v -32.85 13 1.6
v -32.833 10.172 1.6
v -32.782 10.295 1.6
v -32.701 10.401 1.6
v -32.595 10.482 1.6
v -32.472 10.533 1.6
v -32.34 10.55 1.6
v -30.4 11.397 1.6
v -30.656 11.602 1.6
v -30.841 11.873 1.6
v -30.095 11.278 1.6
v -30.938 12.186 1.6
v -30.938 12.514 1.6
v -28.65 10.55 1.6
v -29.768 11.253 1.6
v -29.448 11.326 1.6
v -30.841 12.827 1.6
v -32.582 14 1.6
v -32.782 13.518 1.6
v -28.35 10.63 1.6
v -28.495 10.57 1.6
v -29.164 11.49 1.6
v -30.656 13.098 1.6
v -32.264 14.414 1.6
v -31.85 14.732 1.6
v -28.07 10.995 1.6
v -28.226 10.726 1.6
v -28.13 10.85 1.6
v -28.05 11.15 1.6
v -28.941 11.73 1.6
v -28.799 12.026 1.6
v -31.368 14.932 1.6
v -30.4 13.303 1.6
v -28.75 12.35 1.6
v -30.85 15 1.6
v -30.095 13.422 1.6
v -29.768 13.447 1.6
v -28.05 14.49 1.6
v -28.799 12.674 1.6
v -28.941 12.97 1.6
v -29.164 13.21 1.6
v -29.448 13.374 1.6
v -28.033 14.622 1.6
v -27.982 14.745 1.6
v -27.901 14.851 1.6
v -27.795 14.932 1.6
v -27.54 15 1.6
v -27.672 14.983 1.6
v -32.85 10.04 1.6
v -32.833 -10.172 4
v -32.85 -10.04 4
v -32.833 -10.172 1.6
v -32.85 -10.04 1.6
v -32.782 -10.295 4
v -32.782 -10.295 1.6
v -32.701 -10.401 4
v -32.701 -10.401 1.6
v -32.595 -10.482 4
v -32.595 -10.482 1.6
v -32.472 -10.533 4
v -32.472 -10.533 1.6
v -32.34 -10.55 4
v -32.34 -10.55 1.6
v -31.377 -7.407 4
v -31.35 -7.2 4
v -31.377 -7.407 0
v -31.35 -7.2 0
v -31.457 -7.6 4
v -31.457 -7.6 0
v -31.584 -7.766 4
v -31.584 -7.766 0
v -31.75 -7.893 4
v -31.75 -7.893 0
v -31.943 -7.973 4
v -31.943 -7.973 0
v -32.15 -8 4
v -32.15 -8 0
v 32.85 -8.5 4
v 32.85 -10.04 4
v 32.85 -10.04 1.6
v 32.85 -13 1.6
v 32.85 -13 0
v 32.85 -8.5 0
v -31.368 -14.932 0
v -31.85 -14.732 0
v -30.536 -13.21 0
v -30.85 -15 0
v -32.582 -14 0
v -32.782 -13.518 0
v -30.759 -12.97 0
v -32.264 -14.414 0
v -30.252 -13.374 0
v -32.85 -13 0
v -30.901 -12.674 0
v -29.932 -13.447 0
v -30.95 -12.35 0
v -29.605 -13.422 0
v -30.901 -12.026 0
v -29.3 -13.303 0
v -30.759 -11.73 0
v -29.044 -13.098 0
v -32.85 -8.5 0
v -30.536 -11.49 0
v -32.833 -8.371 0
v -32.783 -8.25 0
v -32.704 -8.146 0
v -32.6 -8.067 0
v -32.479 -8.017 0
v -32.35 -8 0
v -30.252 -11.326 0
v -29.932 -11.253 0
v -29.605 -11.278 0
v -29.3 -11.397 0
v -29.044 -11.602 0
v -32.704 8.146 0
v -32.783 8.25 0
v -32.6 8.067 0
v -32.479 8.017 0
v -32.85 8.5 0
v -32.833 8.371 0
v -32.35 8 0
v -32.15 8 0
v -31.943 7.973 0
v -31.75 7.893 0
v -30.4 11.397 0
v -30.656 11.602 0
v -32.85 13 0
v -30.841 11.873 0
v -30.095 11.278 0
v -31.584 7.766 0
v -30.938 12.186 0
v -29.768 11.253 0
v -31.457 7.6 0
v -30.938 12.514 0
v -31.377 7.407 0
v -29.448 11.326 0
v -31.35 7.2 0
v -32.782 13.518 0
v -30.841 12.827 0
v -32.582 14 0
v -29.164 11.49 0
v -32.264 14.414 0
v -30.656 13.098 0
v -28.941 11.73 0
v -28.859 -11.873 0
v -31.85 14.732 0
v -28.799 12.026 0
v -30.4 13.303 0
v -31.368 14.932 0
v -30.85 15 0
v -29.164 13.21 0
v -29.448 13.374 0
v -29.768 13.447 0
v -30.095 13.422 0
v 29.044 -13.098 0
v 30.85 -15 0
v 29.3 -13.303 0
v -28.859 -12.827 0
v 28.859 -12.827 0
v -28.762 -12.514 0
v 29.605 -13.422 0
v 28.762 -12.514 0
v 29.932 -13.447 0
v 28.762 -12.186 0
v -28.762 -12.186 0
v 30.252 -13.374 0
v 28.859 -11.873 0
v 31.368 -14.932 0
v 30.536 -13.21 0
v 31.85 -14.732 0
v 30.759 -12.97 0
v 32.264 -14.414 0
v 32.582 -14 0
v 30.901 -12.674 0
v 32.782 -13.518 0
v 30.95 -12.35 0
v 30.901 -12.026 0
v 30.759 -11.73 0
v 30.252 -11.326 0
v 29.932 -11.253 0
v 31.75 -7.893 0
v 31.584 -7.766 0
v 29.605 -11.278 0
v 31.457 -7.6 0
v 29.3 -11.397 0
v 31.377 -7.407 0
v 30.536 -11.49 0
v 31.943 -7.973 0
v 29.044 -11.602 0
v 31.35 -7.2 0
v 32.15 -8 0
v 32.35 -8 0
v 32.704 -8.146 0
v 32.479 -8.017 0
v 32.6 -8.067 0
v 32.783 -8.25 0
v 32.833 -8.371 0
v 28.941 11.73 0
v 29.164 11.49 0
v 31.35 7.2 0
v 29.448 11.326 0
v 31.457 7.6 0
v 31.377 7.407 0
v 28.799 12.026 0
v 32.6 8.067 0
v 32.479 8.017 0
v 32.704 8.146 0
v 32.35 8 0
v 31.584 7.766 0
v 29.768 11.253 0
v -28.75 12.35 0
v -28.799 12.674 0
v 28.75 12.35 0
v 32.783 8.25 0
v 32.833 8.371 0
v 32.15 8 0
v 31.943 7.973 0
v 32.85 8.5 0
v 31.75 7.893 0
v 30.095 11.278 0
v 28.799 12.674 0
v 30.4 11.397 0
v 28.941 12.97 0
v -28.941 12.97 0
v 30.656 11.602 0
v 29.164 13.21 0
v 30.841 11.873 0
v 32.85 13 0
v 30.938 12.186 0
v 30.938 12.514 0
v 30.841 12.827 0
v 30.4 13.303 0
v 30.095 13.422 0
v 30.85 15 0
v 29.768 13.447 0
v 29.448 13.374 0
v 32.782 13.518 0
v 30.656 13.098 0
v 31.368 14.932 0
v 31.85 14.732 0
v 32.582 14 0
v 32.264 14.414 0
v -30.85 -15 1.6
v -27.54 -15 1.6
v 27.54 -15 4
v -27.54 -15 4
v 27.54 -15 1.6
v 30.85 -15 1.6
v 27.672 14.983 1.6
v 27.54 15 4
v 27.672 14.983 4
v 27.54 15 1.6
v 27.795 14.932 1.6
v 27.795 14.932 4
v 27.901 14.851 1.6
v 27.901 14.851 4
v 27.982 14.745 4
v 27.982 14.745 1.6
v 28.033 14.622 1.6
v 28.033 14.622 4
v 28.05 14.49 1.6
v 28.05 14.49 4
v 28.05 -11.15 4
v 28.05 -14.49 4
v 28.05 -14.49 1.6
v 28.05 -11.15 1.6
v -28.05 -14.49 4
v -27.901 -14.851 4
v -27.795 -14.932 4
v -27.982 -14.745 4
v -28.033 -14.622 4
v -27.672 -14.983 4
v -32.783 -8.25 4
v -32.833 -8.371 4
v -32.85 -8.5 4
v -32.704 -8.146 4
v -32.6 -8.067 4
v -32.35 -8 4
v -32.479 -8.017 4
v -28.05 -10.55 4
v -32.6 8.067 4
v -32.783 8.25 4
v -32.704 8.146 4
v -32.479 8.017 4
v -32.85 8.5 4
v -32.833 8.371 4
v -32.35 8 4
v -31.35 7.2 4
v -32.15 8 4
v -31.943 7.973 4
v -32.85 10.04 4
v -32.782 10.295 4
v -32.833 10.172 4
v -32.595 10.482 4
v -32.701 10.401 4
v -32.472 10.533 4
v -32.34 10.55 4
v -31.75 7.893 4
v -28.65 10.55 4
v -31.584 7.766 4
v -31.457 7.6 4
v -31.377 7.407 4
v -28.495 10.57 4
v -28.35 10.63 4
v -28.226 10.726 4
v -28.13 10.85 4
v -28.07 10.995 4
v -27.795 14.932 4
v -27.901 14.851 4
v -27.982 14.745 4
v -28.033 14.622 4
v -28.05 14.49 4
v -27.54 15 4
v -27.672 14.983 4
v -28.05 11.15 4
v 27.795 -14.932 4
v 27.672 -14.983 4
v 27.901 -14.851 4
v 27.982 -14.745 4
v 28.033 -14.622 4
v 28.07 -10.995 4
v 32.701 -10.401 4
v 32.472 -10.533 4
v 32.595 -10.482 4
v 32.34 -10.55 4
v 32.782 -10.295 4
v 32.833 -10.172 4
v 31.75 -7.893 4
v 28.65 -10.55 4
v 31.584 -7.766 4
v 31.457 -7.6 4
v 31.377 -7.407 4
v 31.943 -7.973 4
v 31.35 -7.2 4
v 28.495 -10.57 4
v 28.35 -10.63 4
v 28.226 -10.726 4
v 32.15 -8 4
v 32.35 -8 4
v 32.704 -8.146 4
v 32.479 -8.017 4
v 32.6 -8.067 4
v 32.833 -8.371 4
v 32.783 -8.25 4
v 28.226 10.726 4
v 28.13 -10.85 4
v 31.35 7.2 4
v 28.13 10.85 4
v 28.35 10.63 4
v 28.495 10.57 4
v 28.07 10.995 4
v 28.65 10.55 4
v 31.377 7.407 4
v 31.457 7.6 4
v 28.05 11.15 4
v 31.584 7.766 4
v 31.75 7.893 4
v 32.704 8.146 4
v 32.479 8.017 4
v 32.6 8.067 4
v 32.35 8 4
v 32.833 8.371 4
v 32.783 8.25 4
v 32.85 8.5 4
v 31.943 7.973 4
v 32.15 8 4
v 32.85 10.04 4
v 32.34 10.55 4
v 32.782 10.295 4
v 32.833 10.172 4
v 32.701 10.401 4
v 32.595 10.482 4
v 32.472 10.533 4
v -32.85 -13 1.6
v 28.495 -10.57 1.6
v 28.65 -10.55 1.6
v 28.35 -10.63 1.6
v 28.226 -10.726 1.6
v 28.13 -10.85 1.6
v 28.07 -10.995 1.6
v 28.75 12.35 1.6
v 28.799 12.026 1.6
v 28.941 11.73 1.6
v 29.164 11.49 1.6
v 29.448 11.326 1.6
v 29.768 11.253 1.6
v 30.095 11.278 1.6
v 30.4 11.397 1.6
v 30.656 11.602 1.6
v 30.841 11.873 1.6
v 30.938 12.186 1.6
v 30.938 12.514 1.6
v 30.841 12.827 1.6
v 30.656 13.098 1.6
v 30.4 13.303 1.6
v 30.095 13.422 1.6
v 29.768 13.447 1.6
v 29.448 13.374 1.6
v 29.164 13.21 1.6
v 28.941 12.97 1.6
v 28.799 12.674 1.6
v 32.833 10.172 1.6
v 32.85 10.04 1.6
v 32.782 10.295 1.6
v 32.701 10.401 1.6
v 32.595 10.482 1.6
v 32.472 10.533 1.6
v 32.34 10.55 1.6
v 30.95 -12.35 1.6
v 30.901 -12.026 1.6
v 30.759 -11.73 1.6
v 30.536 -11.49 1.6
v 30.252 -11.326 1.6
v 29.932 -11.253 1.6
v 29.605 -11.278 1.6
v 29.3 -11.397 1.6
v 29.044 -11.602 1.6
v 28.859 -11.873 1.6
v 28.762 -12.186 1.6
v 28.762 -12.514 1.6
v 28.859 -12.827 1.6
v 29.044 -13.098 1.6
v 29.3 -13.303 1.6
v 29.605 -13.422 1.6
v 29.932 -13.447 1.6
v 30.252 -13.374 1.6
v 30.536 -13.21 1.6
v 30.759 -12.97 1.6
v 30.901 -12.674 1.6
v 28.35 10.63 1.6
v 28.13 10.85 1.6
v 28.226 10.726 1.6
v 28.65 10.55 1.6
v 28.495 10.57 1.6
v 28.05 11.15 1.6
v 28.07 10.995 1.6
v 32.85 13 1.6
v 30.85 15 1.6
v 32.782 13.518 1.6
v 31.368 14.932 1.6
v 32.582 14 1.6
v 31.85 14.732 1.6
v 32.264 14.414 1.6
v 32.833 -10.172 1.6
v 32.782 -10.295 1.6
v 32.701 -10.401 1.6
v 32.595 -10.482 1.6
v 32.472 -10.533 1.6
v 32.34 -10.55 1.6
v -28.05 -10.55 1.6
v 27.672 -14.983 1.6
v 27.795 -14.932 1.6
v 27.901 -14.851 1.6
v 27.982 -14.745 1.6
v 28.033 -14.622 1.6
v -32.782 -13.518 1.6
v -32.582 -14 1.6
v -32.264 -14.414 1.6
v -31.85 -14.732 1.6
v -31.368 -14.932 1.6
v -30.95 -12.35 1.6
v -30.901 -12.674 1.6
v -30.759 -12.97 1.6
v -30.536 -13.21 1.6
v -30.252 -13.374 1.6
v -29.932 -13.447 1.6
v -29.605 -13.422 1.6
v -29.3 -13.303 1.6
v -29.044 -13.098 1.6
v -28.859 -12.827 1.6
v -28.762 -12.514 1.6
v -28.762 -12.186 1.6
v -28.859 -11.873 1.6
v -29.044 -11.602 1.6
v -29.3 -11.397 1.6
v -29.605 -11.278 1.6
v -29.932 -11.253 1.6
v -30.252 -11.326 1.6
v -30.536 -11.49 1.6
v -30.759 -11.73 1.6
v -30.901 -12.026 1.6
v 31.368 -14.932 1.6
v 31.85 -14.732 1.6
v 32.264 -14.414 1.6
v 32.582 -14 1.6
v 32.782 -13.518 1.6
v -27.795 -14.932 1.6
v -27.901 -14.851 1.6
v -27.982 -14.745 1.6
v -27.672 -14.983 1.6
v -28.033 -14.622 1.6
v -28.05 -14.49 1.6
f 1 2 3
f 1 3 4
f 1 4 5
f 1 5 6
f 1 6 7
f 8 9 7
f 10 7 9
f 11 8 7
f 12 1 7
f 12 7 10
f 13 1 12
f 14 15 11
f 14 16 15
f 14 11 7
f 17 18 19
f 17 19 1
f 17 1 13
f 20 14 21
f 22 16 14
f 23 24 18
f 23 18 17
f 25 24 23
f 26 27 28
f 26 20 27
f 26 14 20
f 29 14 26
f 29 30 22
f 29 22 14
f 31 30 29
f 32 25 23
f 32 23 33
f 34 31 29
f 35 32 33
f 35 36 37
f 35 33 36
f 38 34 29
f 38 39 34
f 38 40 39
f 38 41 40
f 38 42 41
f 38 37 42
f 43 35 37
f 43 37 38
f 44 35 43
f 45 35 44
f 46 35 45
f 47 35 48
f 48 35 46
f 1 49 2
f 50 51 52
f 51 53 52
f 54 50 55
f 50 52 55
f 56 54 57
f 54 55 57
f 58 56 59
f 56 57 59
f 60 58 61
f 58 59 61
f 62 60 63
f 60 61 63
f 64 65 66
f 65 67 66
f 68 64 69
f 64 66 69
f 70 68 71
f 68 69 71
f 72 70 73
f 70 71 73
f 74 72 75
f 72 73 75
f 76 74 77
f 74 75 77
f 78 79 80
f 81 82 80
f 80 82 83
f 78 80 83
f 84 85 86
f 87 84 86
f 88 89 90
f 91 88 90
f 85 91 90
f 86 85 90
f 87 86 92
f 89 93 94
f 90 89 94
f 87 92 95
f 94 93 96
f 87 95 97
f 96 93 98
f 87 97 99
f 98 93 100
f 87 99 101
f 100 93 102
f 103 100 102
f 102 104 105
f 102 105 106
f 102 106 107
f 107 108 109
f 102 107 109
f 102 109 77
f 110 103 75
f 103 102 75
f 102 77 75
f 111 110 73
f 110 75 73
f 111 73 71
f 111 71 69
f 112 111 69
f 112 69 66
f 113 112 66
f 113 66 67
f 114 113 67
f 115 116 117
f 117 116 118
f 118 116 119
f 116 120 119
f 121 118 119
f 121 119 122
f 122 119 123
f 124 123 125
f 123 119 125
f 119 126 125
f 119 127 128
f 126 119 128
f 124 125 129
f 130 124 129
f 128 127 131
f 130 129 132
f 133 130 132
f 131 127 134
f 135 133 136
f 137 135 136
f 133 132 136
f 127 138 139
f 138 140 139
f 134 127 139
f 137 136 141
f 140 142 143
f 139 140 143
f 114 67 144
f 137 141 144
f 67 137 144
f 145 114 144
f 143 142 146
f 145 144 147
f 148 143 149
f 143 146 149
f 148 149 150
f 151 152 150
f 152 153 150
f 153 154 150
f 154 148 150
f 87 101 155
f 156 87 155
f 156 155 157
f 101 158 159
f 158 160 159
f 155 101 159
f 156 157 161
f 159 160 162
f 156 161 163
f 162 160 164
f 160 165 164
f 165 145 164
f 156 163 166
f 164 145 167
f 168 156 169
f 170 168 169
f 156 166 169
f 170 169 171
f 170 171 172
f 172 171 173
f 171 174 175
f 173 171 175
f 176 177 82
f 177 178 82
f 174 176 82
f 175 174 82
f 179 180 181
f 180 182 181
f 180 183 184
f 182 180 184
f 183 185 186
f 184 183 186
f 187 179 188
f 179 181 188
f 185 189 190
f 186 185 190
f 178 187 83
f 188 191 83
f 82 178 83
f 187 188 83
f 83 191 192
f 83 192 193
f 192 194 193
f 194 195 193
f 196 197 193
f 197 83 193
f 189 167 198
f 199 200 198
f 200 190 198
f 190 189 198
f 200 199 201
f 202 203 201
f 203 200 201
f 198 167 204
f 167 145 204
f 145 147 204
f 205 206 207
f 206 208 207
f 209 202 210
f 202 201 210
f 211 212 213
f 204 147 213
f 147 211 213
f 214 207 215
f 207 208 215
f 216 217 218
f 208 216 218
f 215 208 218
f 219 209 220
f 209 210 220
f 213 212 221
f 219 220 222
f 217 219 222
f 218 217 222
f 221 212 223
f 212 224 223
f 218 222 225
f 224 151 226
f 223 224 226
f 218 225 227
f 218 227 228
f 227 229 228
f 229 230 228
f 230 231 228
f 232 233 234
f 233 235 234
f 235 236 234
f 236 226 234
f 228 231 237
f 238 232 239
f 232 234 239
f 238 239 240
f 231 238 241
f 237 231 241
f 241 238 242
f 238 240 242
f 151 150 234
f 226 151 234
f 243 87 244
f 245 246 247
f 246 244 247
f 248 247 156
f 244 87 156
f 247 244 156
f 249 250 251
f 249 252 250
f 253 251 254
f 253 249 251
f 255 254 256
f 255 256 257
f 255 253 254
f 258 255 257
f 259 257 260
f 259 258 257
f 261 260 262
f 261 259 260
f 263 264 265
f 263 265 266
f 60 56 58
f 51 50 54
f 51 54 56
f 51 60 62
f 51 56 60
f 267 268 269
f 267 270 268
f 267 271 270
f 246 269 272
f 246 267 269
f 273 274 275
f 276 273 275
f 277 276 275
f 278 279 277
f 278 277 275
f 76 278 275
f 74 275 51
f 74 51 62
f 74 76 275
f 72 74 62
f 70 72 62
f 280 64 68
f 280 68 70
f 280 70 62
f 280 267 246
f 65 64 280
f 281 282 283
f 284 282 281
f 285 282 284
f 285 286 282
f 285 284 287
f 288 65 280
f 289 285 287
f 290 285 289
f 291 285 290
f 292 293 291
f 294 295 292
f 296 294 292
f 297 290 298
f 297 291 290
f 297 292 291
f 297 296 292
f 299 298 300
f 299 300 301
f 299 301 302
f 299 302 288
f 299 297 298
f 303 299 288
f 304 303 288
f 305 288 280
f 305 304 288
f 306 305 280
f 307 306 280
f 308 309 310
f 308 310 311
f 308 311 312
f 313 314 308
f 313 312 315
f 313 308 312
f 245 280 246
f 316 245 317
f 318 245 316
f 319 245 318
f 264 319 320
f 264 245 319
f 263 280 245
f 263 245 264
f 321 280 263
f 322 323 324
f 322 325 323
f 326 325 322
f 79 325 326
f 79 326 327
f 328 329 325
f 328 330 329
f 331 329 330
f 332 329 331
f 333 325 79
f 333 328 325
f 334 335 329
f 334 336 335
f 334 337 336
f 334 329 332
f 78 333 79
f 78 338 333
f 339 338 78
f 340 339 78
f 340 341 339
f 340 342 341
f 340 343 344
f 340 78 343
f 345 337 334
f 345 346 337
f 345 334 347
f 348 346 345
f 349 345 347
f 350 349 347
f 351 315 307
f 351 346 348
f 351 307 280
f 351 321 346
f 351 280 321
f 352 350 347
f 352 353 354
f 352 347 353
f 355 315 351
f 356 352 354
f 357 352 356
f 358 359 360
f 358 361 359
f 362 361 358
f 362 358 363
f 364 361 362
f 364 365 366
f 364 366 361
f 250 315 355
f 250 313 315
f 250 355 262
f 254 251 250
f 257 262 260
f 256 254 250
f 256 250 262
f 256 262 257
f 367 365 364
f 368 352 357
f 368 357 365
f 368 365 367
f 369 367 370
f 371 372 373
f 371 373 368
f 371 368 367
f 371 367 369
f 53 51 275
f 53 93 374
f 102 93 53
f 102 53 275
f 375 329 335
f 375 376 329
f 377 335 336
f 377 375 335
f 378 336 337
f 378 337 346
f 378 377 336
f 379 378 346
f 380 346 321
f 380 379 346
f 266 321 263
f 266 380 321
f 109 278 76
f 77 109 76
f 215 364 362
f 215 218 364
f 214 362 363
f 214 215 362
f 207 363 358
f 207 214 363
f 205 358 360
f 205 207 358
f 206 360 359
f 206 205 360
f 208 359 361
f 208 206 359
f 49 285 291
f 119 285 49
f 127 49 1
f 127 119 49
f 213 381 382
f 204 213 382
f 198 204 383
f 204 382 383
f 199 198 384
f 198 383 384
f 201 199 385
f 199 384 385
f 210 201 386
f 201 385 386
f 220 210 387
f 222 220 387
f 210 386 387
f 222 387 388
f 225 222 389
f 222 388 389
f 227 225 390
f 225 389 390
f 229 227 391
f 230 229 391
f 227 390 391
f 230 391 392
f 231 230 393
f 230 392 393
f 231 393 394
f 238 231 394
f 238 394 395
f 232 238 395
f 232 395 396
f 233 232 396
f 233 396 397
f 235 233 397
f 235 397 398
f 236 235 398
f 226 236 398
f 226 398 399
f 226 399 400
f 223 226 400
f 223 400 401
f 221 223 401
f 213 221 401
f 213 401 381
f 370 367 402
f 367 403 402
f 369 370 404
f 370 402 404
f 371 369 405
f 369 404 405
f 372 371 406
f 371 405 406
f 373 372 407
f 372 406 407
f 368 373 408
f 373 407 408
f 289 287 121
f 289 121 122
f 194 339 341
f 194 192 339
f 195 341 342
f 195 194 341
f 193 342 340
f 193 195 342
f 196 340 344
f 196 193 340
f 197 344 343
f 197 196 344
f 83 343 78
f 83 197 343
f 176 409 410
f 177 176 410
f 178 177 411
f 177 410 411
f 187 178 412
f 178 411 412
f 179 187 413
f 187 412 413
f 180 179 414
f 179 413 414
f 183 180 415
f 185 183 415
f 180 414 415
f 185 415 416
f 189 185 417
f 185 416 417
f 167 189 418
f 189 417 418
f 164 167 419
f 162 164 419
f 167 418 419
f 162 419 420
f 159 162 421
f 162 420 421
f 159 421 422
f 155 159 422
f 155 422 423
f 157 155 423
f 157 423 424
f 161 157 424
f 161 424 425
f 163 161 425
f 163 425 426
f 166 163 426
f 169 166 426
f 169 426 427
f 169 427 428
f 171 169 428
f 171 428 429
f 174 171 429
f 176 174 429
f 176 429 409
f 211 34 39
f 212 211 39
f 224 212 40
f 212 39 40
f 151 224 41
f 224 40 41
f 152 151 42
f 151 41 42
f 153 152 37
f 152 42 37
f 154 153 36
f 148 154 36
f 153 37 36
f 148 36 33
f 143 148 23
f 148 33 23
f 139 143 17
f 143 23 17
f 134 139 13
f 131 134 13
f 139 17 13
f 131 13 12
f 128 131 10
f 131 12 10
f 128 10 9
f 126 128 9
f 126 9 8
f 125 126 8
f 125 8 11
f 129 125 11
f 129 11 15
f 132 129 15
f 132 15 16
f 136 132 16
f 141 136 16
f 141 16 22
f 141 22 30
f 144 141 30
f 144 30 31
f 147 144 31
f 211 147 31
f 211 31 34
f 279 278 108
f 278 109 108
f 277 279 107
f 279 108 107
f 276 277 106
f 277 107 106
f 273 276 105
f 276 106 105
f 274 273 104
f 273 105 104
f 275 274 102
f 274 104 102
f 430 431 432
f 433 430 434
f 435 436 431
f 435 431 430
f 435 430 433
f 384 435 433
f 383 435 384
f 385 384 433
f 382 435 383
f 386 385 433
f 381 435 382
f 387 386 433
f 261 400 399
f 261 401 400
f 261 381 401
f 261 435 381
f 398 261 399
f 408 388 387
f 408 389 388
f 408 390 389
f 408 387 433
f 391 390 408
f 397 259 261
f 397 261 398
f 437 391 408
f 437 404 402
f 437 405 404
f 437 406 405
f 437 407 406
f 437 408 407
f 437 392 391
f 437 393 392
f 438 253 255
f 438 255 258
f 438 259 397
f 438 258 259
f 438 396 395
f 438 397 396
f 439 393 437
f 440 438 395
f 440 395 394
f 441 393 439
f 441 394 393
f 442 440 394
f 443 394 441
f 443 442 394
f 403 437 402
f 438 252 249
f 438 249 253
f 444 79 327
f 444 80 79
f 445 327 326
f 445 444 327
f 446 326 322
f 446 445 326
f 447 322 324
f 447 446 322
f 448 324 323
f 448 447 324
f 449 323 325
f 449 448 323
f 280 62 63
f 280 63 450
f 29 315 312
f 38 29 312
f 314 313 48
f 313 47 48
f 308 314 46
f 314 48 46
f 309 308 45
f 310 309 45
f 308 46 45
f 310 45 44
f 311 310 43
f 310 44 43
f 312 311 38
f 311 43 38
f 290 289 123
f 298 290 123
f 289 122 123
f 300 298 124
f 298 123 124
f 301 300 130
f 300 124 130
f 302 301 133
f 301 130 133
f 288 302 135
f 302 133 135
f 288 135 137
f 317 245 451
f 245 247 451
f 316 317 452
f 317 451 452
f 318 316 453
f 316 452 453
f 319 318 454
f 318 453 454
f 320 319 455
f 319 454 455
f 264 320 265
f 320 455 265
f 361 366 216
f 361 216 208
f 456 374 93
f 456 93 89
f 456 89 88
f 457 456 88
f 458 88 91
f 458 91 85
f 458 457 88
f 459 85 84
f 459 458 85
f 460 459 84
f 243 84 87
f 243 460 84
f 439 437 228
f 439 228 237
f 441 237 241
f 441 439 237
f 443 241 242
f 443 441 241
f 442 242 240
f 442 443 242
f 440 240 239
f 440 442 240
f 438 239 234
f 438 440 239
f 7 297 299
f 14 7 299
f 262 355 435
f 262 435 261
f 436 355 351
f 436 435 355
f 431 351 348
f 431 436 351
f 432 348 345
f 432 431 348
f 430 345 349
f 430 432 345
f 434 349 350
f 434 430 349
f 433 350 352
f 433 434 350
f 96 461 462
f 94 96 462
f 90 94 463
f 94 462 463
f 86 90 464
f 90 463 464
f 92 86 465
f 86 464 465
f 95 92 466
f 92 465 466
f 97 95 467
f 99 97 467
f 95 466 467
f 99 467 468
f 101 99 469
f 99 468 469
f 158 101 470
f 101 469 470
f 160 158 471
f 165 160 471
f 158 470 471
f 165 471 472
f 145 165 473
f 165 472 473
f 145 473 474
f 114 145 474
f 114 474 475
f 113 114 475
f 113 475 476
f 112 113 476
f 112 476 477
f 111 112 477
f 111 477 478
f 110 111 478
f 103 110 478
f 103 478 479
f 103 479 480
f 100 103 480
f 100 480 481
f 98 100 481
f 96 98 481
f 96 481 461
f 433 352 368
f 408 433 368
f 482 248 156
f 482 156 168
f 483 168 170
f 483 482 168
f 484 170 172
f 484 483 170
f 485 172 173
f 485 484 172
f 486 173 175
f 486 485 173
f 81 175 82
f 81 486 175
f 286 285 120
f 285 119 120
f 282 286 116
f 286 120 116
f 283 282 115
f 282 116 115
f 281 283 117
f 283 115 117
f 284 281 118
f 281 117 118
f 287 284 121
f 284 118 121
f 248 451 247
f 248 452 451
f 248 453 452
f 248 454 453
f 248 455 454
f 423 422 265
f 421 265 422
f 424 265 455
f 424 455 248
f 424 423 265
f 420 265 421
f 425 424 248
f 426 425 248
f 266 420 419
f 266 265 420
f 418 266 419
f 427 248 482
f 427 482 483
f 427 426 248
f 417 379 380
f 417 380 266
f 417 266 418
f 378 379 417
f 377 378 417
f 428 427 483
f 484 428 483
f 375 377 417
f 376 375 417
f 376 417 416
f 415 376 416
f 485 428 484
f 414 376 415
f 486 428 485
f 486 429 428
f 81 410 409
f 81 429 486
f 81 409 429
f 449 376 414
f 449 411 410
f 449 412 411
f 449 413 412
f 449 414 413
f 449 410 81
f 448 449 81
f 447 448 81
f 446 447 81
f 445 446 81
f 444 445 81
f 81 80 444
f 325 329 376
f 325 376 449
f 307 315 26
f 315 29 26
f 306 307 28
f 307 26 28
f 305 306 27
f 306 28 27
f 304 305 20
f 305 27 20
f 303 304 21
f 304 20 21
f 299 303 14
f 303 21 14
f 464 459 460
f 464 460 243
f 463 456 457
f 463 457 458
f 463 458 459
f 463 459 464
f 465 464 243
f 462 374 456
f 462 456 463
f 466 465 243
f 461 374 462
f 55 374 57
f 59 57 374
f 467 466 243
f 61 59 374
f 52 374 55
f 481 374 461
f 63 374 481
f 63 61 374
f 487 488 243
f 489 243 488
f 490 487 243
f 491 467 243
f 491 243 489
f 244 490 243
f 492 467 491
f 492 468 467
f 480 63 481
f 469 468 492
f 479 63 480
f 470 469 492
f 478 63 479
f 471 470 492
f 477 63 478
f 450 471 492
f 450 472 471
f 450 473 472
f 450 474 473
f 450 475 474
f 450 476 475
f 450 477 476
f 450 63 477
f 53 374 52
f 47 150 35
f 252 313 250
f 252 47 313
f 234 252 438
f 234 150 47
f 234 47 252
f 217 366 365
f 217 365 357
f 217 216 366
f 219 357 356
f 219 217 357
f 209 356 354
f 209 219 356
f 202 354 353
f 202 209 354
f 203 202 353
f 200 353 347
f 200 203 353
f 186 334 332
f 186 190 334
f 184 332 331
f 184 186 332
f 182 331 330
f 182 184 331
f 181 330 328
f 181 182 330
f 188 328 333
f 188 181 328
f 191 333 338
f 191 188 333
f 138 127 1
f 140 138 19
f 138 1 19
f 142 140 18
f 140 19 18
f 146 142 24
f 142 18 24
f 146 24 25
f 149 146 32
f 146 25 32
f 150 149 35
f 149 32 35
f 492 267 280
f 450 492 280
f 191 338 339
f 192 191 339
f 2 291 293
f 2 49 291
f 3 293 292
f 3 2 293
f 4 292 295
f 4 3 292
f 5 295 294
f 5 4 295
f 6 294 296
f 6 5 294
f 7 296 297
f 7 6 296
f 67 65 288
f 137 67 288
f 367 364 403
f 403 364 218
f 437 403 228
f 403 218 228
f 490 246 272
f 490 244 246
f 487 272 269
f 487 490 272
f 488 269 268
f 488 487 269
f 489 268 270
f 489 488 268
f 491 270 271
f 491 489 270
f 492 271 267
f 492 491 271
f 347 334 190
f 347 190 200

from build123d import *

# Parameters (mm, degrees)
SKETCH_2_W          = 65.7
SKETCH_2_H          = 30
EXTRUDE_1_DEPTH     = 4
FILLET_1_R          = 2
SKETCH_5_R          = 1.1
SKETCH_5_W          = 1.5
SKETCH_5_H          = 16
CUT_EXTRUDE_6_DEPTH = 37.333490061
SKETCH_3_W          = 4.8
SKETCH_3_H          = 4.45
SKETCH_3_R          = 1.1
CUT_EXTRUDE_5_DEPTH = 2.4
FILLET_7_R          = 0.51
FILLET_8_R          = 0.6
FILLET_9_R          = 0.5
FILLET_10_R         = 0.8


with BuildPart() as part:
    # 스케치2 → 보스-돌출1 (new body)
    with BuildSketch(Plane.XY):
        Rectangle(SKETCH_2_W, SKETCH_2_H)
    extrude(amount=EXTRUDE_1_DEPTH)

    # 필렛1
    fillet_1_edges = [part.edges().sort_by_distance(p)[0] for p in [
        (32.85, 15, 2),
        (32.85, -15, 2),
        (-32.85, -15, 2),
        (-32.85, 15, 2),
    ]]
    fillet(fillet_1_edges, radius=FILLET_1_R)

    # 스케치5 → 컷-돌출6 (cut, through all)
    with BuildSketch(Plane.XY.offset(4)):
        with Locations((-29.85, 12.35)):
            Circle(SKETCH_5_R)
        with Locations(Location((29.85, 12.35, 0), (0, 0, 180))):
            Circle(SKETCH_5_R)
        with Locations((29.85, -12.35)):
            Circle(SKETCH_5_R)
        with Locations(Location((-29.85, -12.35, 0), (0, 0, 180))):
            Circle(SKETCH_5_R)
        with Locations((-32.1, 0)):
            Rectangle(SKETCH_5_W, SKETCH_5_H)
        with Locations((32.1, 0)):
            Rectangle(SKETCH_5_W, SKETCH_5_H)
    extrude(amount=-CUT_EXTRUDE_6_DEPTH, mode=Mode.SUBTRACT)

    # 스케치3 → 컷-돌출5 (cut)
    # profile 1 of 4: a face of its own
    with BuildSketch(Plane.XY.offset(4)):
        with Locations((-30.45, 12.775)):
            Rectangle(SKETCH_3_W, SKETCH_3_H)
        with Locations((-29.85, 12.35)):
            Circle(SKETCH_3_R, mode=Mode.SUBTRACT)
    # profile 2 of 4: a face of its own
    with BuildSketch(Plane.XY.offset(4)):
        with Locations((-30.45, -12.775)):
            Rectangle(SKETCH_3_W, SKETCH_3_H)
        with Locations(Location((-29.85, -12.35, 0), (0, 0, 180))):
            Circle(SKETCH_3_R, mode=Mode.SUBTRACT)
    # profile 3 of 4: a face of its own
    with BuildSketch(Plane.XY.offset(4)):
        with Locations((30.45, -12.775)):
            Rectangle(SKETCH_3_W, SKETCH_3_H)
        with Locations((29.85, -12.35)):
            Circle(SKETCH_3_R, mode=Mode.SUBTRACT)
    # profile 4 of 4: a face of its own
    with BuildSketch(Plane.XY.offset(4)):
        with Locations((30.45, 12.775)):
            Rectangle(SKETCH_3_W, SKETCH_3_H)
        with Locations(Location((29.85, 12.35, 0), (0, 0, 180))):
            Circle(SKETCH_3_R, mode=Mode.SUBTRACT)
    extrude(amount=-CUT_EXTRUDE_5_DEPTH, mode=Mode.SUBTRACT)

    # 필렛7
    fillet_7_edges = [part.edges().sort_by_distance(p)[0] for p in [
        (-32.85, -10.55, 2.8),
        (-28.05, -15, 2.8),
        (28.05, -15, 2.8),
        (32.85, -10.55, 2.8),
        (32.85, 10.55, 2.8),
        (28.05, 15, 2.8),
        (-28.05, 15, 2.8),
        (-32.85, 10.55, 2.8),
    ]]
    fillet(fillet_7_edges, radius=FILLET_7_R)

    # 필렛8
    fillet_8_edges = [part.edges().sort_by_distance(p)[0] for p in [
        (28.05, -10.55, 2.8),
        (28.05, 10.55, 2.8),
        (-28.05, 10.55, 2.8),
    ]]
    fillet(fillet_8_edges, radius=FILLET_8_R)

    # 필렛9
    fillet_9_edges = [part.edges().sort_by_distance(p)[0] for p in [
        (32.85, 8, 2),
        (32.85, -8, 2),
        (-32.85, -8, 2),
        (-32.85, 8, 2),
    ]]
    fillet(fillet_9_edges, radius=FILLET_9_R)

    # 필렛10
    fillet_10_edges = [part.edges().sort_by_distance(p)[0] for p in [
        (31.35, 8, 2),
        (31.35, -8, 2),
        (-31.35, 8, 2),
        (-31.35, -8, 2),
    ]]
    fillet(fillet_10_edges, radius=FILLET_10_R)


solid = part.part
